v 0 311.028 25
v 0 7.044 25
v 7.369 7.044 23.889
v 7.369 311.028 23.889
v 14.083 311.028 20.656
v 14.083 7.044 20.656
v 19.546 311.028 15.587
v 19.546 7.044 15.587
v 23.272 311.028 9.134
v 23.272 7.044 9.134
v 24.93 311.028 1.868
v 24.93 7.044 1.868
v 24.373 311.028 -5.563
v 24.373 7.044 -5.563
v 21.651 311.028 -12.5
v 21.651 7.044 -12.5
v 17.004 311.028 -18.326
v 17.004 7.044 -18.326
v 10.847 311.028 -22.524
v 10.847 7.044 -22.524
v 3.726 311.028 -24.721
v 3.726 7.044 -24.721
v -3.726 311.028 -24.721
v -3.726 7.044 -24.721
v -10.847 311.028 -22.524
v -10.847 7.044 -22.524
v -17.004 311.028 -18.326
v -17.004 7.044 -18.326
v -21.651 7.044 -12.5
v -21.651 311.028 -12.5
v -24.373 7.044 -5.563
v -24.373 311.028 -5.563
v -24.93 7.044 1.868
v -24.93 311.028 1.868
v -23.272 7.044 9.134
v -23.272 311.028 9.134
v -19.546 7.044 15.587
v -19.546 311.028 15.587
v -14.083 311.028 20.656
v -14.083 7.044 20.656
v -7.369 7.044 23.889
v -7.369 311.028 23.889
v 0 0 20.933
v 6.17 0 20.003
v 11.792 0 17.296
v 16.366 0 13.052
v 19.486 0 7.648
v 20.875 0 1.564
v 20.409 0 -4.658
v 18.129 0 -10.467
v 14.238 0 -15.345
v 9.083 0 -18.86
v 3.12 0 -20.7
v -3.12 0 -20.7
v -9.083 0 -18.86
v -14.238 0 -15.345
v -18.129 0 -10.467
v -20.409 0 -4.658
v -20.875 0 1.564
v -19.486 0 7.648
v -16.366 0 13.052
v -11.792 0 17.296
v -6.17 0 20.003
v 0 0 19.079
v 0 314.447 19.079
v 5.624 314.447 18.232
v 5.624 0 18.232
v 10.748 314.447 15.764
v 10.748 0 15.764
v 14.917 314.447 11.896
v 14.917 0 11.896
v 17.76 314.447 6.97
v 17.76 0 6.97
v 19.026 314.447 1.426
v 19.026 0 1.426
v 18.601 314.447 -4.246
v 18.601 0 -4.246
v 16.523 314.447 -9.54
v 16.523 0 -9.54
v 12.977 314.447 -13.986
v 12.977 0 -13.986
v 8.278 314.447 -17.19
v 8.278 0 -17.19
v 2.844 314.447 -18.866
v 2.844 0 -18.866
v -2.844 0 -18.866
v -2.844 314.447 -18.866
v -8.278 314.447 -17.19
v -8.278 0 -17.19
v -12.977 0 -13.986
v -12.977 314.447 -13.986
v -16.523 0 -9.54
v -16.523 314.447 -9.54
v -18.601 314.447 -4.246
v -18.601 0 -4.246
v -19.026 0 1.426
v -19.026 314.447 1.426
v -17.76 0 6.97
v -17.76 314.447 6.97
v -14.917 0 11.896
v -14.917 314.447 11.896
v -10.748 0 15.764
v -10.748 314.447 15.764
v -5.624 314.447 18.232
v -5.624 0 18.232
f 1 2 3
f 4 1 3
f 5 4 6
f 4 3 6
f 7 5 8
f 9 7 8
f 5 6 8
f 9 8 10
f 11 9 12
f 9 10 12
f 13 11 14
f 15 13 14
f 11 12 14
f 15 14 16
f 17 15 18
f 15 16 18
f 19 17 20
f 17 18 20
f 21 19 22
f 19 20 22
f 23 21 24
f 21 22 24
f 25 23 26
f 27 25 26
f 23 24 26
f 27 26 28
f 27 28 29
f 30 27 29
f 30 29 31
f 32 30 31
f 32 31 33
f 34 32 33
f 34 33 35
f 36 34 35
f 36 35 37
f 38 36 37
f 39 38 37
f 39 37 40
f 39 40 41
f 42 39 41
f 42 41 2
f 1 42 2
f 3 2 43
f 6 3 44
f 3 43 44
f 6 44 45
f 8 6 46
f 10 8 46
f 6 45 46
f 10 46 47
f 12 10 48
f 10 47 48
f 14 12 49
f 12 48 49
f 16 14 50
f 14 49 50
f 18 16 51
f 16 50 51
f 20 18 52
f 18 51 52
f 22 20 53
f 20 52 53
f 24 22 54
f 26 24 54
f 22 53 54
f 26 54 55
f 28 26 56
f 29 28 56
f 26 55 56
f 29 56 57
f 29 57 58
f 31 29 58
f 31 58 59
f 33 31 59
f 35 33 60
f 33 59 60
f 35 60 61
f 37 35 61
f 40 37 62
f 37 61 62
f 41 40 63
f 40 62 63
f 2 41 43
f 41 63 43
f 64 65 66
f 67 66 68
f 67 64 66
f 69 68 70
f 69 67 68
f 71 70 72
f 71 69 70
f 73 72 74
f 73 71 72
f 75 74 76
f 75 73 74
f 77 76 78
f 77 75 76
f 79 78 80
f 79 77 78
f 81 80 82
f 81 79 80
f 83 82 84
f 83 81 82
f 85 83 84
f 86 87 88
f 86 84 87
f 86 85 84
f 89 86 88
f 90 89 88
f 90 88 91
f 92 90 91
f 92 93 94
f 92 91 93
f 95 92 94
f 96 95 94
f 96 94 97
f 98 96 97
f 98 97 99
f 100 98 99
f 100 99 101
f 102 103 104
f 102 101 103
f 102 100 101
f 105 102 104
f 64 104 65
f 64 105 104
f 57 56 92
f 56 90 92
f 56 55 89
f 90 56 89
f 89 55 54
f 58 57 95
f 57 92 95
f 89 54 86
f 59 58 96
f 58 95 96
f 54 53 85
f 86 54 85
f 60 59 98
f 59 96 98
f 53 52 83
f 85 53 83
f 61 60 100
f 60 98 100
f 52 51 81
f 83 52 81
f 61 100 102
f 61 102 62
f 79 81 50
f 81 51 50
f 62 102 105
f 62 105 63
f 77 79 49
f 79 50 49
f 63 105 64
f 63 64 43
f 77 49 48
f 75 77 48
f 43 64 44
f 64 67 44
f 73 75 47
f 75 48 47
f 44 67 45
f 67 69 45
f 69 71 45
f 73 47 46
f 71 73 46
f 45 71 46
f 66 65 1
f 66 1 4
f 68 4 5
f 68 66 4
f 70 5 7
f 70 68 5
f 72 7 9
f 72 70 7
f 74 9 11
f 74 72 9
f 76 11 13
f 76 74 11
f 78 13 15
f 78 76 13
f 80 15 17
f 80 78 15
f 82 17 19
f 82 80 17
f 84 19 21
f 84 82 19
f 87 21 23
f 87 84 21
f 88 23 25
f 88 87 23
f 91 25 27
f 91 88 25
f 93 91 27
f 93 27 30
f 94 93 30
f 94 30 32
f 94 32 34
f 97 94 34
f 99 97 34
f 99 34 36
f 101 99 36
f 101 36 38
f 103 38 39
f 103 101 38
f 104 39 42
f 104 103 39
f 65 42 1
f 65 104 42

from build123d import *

# Parameters (mm, degrees)
SKETCH1_R           = 25
BOSS_EXTRUDE1_DEPTH = 315.095017
SKETCH2_R           = 19.079270484
CUT_EXTRUDE1_DEPTH  = 318.07234149
CHAMFER1_SIZE       = 4.06661
CHAMFER1_SIZE_2     = 7.043576


with BuildPart() as part:
    # Sketch1 → Boss-Extrude1 (new body)
    with BuildSketch(Plane(origin=(0, 0, 0), x_dir=(1, 0, 0), z_dir=(0, 1, 0))):
        with Locations(Location((0, 0, 0), (0, 0, 270))):
            Circle(SKETCH1_R)
    extrude(amount=BOSS_EXTRUDE1_DEPTH)

    # Sketch2 → Cut-Extrude1 (cut, through all)
    with BuildSketch(Plane(origin=(0, 0, 0), x_dir=(1, 0, 0), z_dir=(0, 1, 0))):
        with Locations(Location((0, 0, 0), (0, 0, 270))):
            Circle(SKETCH2_R)
    extrude(amount=CUT_EXTRUDE1_DEPTH, mode=Mode.SUBTRACT)

    # Chamfer1
    # the kernel refuses this chamfer: 7.043576, 4.06661 mm, written as the material it takes off along each edge
    with BuildSketch(Plane(origin=(0, 315.095017, 0), x_dir=(0, 0, 1), z_dir=(-1, 0, 0))) as chamfer1_piece_1:
        Polygon((25, -CHAMFER1_SIZE), (25 - CHAMFER1_SIZE_2, 0), (25, 0), align=None)
    revolve(axis=Axis((0, 315.095017, 0), (0, 1, 0)), mode=Mode.SUBTRACT)
    with BuildSketch(Plane(origin=(0, 0, 0), x_dir=(0, 0, 1), z_dir=(-1, 0, 0))) as chamfer1_piece_2:
        Polygon((25, CHAMFER1_SIZE_2), (25 - CHAMFER1_SIZE, 0), (25, 0), align=None)
    revolve(axis=Axis((0, 0, 0), (0, 1, 0)), mode=Mode.SUBTRACT)


solid = part.part
